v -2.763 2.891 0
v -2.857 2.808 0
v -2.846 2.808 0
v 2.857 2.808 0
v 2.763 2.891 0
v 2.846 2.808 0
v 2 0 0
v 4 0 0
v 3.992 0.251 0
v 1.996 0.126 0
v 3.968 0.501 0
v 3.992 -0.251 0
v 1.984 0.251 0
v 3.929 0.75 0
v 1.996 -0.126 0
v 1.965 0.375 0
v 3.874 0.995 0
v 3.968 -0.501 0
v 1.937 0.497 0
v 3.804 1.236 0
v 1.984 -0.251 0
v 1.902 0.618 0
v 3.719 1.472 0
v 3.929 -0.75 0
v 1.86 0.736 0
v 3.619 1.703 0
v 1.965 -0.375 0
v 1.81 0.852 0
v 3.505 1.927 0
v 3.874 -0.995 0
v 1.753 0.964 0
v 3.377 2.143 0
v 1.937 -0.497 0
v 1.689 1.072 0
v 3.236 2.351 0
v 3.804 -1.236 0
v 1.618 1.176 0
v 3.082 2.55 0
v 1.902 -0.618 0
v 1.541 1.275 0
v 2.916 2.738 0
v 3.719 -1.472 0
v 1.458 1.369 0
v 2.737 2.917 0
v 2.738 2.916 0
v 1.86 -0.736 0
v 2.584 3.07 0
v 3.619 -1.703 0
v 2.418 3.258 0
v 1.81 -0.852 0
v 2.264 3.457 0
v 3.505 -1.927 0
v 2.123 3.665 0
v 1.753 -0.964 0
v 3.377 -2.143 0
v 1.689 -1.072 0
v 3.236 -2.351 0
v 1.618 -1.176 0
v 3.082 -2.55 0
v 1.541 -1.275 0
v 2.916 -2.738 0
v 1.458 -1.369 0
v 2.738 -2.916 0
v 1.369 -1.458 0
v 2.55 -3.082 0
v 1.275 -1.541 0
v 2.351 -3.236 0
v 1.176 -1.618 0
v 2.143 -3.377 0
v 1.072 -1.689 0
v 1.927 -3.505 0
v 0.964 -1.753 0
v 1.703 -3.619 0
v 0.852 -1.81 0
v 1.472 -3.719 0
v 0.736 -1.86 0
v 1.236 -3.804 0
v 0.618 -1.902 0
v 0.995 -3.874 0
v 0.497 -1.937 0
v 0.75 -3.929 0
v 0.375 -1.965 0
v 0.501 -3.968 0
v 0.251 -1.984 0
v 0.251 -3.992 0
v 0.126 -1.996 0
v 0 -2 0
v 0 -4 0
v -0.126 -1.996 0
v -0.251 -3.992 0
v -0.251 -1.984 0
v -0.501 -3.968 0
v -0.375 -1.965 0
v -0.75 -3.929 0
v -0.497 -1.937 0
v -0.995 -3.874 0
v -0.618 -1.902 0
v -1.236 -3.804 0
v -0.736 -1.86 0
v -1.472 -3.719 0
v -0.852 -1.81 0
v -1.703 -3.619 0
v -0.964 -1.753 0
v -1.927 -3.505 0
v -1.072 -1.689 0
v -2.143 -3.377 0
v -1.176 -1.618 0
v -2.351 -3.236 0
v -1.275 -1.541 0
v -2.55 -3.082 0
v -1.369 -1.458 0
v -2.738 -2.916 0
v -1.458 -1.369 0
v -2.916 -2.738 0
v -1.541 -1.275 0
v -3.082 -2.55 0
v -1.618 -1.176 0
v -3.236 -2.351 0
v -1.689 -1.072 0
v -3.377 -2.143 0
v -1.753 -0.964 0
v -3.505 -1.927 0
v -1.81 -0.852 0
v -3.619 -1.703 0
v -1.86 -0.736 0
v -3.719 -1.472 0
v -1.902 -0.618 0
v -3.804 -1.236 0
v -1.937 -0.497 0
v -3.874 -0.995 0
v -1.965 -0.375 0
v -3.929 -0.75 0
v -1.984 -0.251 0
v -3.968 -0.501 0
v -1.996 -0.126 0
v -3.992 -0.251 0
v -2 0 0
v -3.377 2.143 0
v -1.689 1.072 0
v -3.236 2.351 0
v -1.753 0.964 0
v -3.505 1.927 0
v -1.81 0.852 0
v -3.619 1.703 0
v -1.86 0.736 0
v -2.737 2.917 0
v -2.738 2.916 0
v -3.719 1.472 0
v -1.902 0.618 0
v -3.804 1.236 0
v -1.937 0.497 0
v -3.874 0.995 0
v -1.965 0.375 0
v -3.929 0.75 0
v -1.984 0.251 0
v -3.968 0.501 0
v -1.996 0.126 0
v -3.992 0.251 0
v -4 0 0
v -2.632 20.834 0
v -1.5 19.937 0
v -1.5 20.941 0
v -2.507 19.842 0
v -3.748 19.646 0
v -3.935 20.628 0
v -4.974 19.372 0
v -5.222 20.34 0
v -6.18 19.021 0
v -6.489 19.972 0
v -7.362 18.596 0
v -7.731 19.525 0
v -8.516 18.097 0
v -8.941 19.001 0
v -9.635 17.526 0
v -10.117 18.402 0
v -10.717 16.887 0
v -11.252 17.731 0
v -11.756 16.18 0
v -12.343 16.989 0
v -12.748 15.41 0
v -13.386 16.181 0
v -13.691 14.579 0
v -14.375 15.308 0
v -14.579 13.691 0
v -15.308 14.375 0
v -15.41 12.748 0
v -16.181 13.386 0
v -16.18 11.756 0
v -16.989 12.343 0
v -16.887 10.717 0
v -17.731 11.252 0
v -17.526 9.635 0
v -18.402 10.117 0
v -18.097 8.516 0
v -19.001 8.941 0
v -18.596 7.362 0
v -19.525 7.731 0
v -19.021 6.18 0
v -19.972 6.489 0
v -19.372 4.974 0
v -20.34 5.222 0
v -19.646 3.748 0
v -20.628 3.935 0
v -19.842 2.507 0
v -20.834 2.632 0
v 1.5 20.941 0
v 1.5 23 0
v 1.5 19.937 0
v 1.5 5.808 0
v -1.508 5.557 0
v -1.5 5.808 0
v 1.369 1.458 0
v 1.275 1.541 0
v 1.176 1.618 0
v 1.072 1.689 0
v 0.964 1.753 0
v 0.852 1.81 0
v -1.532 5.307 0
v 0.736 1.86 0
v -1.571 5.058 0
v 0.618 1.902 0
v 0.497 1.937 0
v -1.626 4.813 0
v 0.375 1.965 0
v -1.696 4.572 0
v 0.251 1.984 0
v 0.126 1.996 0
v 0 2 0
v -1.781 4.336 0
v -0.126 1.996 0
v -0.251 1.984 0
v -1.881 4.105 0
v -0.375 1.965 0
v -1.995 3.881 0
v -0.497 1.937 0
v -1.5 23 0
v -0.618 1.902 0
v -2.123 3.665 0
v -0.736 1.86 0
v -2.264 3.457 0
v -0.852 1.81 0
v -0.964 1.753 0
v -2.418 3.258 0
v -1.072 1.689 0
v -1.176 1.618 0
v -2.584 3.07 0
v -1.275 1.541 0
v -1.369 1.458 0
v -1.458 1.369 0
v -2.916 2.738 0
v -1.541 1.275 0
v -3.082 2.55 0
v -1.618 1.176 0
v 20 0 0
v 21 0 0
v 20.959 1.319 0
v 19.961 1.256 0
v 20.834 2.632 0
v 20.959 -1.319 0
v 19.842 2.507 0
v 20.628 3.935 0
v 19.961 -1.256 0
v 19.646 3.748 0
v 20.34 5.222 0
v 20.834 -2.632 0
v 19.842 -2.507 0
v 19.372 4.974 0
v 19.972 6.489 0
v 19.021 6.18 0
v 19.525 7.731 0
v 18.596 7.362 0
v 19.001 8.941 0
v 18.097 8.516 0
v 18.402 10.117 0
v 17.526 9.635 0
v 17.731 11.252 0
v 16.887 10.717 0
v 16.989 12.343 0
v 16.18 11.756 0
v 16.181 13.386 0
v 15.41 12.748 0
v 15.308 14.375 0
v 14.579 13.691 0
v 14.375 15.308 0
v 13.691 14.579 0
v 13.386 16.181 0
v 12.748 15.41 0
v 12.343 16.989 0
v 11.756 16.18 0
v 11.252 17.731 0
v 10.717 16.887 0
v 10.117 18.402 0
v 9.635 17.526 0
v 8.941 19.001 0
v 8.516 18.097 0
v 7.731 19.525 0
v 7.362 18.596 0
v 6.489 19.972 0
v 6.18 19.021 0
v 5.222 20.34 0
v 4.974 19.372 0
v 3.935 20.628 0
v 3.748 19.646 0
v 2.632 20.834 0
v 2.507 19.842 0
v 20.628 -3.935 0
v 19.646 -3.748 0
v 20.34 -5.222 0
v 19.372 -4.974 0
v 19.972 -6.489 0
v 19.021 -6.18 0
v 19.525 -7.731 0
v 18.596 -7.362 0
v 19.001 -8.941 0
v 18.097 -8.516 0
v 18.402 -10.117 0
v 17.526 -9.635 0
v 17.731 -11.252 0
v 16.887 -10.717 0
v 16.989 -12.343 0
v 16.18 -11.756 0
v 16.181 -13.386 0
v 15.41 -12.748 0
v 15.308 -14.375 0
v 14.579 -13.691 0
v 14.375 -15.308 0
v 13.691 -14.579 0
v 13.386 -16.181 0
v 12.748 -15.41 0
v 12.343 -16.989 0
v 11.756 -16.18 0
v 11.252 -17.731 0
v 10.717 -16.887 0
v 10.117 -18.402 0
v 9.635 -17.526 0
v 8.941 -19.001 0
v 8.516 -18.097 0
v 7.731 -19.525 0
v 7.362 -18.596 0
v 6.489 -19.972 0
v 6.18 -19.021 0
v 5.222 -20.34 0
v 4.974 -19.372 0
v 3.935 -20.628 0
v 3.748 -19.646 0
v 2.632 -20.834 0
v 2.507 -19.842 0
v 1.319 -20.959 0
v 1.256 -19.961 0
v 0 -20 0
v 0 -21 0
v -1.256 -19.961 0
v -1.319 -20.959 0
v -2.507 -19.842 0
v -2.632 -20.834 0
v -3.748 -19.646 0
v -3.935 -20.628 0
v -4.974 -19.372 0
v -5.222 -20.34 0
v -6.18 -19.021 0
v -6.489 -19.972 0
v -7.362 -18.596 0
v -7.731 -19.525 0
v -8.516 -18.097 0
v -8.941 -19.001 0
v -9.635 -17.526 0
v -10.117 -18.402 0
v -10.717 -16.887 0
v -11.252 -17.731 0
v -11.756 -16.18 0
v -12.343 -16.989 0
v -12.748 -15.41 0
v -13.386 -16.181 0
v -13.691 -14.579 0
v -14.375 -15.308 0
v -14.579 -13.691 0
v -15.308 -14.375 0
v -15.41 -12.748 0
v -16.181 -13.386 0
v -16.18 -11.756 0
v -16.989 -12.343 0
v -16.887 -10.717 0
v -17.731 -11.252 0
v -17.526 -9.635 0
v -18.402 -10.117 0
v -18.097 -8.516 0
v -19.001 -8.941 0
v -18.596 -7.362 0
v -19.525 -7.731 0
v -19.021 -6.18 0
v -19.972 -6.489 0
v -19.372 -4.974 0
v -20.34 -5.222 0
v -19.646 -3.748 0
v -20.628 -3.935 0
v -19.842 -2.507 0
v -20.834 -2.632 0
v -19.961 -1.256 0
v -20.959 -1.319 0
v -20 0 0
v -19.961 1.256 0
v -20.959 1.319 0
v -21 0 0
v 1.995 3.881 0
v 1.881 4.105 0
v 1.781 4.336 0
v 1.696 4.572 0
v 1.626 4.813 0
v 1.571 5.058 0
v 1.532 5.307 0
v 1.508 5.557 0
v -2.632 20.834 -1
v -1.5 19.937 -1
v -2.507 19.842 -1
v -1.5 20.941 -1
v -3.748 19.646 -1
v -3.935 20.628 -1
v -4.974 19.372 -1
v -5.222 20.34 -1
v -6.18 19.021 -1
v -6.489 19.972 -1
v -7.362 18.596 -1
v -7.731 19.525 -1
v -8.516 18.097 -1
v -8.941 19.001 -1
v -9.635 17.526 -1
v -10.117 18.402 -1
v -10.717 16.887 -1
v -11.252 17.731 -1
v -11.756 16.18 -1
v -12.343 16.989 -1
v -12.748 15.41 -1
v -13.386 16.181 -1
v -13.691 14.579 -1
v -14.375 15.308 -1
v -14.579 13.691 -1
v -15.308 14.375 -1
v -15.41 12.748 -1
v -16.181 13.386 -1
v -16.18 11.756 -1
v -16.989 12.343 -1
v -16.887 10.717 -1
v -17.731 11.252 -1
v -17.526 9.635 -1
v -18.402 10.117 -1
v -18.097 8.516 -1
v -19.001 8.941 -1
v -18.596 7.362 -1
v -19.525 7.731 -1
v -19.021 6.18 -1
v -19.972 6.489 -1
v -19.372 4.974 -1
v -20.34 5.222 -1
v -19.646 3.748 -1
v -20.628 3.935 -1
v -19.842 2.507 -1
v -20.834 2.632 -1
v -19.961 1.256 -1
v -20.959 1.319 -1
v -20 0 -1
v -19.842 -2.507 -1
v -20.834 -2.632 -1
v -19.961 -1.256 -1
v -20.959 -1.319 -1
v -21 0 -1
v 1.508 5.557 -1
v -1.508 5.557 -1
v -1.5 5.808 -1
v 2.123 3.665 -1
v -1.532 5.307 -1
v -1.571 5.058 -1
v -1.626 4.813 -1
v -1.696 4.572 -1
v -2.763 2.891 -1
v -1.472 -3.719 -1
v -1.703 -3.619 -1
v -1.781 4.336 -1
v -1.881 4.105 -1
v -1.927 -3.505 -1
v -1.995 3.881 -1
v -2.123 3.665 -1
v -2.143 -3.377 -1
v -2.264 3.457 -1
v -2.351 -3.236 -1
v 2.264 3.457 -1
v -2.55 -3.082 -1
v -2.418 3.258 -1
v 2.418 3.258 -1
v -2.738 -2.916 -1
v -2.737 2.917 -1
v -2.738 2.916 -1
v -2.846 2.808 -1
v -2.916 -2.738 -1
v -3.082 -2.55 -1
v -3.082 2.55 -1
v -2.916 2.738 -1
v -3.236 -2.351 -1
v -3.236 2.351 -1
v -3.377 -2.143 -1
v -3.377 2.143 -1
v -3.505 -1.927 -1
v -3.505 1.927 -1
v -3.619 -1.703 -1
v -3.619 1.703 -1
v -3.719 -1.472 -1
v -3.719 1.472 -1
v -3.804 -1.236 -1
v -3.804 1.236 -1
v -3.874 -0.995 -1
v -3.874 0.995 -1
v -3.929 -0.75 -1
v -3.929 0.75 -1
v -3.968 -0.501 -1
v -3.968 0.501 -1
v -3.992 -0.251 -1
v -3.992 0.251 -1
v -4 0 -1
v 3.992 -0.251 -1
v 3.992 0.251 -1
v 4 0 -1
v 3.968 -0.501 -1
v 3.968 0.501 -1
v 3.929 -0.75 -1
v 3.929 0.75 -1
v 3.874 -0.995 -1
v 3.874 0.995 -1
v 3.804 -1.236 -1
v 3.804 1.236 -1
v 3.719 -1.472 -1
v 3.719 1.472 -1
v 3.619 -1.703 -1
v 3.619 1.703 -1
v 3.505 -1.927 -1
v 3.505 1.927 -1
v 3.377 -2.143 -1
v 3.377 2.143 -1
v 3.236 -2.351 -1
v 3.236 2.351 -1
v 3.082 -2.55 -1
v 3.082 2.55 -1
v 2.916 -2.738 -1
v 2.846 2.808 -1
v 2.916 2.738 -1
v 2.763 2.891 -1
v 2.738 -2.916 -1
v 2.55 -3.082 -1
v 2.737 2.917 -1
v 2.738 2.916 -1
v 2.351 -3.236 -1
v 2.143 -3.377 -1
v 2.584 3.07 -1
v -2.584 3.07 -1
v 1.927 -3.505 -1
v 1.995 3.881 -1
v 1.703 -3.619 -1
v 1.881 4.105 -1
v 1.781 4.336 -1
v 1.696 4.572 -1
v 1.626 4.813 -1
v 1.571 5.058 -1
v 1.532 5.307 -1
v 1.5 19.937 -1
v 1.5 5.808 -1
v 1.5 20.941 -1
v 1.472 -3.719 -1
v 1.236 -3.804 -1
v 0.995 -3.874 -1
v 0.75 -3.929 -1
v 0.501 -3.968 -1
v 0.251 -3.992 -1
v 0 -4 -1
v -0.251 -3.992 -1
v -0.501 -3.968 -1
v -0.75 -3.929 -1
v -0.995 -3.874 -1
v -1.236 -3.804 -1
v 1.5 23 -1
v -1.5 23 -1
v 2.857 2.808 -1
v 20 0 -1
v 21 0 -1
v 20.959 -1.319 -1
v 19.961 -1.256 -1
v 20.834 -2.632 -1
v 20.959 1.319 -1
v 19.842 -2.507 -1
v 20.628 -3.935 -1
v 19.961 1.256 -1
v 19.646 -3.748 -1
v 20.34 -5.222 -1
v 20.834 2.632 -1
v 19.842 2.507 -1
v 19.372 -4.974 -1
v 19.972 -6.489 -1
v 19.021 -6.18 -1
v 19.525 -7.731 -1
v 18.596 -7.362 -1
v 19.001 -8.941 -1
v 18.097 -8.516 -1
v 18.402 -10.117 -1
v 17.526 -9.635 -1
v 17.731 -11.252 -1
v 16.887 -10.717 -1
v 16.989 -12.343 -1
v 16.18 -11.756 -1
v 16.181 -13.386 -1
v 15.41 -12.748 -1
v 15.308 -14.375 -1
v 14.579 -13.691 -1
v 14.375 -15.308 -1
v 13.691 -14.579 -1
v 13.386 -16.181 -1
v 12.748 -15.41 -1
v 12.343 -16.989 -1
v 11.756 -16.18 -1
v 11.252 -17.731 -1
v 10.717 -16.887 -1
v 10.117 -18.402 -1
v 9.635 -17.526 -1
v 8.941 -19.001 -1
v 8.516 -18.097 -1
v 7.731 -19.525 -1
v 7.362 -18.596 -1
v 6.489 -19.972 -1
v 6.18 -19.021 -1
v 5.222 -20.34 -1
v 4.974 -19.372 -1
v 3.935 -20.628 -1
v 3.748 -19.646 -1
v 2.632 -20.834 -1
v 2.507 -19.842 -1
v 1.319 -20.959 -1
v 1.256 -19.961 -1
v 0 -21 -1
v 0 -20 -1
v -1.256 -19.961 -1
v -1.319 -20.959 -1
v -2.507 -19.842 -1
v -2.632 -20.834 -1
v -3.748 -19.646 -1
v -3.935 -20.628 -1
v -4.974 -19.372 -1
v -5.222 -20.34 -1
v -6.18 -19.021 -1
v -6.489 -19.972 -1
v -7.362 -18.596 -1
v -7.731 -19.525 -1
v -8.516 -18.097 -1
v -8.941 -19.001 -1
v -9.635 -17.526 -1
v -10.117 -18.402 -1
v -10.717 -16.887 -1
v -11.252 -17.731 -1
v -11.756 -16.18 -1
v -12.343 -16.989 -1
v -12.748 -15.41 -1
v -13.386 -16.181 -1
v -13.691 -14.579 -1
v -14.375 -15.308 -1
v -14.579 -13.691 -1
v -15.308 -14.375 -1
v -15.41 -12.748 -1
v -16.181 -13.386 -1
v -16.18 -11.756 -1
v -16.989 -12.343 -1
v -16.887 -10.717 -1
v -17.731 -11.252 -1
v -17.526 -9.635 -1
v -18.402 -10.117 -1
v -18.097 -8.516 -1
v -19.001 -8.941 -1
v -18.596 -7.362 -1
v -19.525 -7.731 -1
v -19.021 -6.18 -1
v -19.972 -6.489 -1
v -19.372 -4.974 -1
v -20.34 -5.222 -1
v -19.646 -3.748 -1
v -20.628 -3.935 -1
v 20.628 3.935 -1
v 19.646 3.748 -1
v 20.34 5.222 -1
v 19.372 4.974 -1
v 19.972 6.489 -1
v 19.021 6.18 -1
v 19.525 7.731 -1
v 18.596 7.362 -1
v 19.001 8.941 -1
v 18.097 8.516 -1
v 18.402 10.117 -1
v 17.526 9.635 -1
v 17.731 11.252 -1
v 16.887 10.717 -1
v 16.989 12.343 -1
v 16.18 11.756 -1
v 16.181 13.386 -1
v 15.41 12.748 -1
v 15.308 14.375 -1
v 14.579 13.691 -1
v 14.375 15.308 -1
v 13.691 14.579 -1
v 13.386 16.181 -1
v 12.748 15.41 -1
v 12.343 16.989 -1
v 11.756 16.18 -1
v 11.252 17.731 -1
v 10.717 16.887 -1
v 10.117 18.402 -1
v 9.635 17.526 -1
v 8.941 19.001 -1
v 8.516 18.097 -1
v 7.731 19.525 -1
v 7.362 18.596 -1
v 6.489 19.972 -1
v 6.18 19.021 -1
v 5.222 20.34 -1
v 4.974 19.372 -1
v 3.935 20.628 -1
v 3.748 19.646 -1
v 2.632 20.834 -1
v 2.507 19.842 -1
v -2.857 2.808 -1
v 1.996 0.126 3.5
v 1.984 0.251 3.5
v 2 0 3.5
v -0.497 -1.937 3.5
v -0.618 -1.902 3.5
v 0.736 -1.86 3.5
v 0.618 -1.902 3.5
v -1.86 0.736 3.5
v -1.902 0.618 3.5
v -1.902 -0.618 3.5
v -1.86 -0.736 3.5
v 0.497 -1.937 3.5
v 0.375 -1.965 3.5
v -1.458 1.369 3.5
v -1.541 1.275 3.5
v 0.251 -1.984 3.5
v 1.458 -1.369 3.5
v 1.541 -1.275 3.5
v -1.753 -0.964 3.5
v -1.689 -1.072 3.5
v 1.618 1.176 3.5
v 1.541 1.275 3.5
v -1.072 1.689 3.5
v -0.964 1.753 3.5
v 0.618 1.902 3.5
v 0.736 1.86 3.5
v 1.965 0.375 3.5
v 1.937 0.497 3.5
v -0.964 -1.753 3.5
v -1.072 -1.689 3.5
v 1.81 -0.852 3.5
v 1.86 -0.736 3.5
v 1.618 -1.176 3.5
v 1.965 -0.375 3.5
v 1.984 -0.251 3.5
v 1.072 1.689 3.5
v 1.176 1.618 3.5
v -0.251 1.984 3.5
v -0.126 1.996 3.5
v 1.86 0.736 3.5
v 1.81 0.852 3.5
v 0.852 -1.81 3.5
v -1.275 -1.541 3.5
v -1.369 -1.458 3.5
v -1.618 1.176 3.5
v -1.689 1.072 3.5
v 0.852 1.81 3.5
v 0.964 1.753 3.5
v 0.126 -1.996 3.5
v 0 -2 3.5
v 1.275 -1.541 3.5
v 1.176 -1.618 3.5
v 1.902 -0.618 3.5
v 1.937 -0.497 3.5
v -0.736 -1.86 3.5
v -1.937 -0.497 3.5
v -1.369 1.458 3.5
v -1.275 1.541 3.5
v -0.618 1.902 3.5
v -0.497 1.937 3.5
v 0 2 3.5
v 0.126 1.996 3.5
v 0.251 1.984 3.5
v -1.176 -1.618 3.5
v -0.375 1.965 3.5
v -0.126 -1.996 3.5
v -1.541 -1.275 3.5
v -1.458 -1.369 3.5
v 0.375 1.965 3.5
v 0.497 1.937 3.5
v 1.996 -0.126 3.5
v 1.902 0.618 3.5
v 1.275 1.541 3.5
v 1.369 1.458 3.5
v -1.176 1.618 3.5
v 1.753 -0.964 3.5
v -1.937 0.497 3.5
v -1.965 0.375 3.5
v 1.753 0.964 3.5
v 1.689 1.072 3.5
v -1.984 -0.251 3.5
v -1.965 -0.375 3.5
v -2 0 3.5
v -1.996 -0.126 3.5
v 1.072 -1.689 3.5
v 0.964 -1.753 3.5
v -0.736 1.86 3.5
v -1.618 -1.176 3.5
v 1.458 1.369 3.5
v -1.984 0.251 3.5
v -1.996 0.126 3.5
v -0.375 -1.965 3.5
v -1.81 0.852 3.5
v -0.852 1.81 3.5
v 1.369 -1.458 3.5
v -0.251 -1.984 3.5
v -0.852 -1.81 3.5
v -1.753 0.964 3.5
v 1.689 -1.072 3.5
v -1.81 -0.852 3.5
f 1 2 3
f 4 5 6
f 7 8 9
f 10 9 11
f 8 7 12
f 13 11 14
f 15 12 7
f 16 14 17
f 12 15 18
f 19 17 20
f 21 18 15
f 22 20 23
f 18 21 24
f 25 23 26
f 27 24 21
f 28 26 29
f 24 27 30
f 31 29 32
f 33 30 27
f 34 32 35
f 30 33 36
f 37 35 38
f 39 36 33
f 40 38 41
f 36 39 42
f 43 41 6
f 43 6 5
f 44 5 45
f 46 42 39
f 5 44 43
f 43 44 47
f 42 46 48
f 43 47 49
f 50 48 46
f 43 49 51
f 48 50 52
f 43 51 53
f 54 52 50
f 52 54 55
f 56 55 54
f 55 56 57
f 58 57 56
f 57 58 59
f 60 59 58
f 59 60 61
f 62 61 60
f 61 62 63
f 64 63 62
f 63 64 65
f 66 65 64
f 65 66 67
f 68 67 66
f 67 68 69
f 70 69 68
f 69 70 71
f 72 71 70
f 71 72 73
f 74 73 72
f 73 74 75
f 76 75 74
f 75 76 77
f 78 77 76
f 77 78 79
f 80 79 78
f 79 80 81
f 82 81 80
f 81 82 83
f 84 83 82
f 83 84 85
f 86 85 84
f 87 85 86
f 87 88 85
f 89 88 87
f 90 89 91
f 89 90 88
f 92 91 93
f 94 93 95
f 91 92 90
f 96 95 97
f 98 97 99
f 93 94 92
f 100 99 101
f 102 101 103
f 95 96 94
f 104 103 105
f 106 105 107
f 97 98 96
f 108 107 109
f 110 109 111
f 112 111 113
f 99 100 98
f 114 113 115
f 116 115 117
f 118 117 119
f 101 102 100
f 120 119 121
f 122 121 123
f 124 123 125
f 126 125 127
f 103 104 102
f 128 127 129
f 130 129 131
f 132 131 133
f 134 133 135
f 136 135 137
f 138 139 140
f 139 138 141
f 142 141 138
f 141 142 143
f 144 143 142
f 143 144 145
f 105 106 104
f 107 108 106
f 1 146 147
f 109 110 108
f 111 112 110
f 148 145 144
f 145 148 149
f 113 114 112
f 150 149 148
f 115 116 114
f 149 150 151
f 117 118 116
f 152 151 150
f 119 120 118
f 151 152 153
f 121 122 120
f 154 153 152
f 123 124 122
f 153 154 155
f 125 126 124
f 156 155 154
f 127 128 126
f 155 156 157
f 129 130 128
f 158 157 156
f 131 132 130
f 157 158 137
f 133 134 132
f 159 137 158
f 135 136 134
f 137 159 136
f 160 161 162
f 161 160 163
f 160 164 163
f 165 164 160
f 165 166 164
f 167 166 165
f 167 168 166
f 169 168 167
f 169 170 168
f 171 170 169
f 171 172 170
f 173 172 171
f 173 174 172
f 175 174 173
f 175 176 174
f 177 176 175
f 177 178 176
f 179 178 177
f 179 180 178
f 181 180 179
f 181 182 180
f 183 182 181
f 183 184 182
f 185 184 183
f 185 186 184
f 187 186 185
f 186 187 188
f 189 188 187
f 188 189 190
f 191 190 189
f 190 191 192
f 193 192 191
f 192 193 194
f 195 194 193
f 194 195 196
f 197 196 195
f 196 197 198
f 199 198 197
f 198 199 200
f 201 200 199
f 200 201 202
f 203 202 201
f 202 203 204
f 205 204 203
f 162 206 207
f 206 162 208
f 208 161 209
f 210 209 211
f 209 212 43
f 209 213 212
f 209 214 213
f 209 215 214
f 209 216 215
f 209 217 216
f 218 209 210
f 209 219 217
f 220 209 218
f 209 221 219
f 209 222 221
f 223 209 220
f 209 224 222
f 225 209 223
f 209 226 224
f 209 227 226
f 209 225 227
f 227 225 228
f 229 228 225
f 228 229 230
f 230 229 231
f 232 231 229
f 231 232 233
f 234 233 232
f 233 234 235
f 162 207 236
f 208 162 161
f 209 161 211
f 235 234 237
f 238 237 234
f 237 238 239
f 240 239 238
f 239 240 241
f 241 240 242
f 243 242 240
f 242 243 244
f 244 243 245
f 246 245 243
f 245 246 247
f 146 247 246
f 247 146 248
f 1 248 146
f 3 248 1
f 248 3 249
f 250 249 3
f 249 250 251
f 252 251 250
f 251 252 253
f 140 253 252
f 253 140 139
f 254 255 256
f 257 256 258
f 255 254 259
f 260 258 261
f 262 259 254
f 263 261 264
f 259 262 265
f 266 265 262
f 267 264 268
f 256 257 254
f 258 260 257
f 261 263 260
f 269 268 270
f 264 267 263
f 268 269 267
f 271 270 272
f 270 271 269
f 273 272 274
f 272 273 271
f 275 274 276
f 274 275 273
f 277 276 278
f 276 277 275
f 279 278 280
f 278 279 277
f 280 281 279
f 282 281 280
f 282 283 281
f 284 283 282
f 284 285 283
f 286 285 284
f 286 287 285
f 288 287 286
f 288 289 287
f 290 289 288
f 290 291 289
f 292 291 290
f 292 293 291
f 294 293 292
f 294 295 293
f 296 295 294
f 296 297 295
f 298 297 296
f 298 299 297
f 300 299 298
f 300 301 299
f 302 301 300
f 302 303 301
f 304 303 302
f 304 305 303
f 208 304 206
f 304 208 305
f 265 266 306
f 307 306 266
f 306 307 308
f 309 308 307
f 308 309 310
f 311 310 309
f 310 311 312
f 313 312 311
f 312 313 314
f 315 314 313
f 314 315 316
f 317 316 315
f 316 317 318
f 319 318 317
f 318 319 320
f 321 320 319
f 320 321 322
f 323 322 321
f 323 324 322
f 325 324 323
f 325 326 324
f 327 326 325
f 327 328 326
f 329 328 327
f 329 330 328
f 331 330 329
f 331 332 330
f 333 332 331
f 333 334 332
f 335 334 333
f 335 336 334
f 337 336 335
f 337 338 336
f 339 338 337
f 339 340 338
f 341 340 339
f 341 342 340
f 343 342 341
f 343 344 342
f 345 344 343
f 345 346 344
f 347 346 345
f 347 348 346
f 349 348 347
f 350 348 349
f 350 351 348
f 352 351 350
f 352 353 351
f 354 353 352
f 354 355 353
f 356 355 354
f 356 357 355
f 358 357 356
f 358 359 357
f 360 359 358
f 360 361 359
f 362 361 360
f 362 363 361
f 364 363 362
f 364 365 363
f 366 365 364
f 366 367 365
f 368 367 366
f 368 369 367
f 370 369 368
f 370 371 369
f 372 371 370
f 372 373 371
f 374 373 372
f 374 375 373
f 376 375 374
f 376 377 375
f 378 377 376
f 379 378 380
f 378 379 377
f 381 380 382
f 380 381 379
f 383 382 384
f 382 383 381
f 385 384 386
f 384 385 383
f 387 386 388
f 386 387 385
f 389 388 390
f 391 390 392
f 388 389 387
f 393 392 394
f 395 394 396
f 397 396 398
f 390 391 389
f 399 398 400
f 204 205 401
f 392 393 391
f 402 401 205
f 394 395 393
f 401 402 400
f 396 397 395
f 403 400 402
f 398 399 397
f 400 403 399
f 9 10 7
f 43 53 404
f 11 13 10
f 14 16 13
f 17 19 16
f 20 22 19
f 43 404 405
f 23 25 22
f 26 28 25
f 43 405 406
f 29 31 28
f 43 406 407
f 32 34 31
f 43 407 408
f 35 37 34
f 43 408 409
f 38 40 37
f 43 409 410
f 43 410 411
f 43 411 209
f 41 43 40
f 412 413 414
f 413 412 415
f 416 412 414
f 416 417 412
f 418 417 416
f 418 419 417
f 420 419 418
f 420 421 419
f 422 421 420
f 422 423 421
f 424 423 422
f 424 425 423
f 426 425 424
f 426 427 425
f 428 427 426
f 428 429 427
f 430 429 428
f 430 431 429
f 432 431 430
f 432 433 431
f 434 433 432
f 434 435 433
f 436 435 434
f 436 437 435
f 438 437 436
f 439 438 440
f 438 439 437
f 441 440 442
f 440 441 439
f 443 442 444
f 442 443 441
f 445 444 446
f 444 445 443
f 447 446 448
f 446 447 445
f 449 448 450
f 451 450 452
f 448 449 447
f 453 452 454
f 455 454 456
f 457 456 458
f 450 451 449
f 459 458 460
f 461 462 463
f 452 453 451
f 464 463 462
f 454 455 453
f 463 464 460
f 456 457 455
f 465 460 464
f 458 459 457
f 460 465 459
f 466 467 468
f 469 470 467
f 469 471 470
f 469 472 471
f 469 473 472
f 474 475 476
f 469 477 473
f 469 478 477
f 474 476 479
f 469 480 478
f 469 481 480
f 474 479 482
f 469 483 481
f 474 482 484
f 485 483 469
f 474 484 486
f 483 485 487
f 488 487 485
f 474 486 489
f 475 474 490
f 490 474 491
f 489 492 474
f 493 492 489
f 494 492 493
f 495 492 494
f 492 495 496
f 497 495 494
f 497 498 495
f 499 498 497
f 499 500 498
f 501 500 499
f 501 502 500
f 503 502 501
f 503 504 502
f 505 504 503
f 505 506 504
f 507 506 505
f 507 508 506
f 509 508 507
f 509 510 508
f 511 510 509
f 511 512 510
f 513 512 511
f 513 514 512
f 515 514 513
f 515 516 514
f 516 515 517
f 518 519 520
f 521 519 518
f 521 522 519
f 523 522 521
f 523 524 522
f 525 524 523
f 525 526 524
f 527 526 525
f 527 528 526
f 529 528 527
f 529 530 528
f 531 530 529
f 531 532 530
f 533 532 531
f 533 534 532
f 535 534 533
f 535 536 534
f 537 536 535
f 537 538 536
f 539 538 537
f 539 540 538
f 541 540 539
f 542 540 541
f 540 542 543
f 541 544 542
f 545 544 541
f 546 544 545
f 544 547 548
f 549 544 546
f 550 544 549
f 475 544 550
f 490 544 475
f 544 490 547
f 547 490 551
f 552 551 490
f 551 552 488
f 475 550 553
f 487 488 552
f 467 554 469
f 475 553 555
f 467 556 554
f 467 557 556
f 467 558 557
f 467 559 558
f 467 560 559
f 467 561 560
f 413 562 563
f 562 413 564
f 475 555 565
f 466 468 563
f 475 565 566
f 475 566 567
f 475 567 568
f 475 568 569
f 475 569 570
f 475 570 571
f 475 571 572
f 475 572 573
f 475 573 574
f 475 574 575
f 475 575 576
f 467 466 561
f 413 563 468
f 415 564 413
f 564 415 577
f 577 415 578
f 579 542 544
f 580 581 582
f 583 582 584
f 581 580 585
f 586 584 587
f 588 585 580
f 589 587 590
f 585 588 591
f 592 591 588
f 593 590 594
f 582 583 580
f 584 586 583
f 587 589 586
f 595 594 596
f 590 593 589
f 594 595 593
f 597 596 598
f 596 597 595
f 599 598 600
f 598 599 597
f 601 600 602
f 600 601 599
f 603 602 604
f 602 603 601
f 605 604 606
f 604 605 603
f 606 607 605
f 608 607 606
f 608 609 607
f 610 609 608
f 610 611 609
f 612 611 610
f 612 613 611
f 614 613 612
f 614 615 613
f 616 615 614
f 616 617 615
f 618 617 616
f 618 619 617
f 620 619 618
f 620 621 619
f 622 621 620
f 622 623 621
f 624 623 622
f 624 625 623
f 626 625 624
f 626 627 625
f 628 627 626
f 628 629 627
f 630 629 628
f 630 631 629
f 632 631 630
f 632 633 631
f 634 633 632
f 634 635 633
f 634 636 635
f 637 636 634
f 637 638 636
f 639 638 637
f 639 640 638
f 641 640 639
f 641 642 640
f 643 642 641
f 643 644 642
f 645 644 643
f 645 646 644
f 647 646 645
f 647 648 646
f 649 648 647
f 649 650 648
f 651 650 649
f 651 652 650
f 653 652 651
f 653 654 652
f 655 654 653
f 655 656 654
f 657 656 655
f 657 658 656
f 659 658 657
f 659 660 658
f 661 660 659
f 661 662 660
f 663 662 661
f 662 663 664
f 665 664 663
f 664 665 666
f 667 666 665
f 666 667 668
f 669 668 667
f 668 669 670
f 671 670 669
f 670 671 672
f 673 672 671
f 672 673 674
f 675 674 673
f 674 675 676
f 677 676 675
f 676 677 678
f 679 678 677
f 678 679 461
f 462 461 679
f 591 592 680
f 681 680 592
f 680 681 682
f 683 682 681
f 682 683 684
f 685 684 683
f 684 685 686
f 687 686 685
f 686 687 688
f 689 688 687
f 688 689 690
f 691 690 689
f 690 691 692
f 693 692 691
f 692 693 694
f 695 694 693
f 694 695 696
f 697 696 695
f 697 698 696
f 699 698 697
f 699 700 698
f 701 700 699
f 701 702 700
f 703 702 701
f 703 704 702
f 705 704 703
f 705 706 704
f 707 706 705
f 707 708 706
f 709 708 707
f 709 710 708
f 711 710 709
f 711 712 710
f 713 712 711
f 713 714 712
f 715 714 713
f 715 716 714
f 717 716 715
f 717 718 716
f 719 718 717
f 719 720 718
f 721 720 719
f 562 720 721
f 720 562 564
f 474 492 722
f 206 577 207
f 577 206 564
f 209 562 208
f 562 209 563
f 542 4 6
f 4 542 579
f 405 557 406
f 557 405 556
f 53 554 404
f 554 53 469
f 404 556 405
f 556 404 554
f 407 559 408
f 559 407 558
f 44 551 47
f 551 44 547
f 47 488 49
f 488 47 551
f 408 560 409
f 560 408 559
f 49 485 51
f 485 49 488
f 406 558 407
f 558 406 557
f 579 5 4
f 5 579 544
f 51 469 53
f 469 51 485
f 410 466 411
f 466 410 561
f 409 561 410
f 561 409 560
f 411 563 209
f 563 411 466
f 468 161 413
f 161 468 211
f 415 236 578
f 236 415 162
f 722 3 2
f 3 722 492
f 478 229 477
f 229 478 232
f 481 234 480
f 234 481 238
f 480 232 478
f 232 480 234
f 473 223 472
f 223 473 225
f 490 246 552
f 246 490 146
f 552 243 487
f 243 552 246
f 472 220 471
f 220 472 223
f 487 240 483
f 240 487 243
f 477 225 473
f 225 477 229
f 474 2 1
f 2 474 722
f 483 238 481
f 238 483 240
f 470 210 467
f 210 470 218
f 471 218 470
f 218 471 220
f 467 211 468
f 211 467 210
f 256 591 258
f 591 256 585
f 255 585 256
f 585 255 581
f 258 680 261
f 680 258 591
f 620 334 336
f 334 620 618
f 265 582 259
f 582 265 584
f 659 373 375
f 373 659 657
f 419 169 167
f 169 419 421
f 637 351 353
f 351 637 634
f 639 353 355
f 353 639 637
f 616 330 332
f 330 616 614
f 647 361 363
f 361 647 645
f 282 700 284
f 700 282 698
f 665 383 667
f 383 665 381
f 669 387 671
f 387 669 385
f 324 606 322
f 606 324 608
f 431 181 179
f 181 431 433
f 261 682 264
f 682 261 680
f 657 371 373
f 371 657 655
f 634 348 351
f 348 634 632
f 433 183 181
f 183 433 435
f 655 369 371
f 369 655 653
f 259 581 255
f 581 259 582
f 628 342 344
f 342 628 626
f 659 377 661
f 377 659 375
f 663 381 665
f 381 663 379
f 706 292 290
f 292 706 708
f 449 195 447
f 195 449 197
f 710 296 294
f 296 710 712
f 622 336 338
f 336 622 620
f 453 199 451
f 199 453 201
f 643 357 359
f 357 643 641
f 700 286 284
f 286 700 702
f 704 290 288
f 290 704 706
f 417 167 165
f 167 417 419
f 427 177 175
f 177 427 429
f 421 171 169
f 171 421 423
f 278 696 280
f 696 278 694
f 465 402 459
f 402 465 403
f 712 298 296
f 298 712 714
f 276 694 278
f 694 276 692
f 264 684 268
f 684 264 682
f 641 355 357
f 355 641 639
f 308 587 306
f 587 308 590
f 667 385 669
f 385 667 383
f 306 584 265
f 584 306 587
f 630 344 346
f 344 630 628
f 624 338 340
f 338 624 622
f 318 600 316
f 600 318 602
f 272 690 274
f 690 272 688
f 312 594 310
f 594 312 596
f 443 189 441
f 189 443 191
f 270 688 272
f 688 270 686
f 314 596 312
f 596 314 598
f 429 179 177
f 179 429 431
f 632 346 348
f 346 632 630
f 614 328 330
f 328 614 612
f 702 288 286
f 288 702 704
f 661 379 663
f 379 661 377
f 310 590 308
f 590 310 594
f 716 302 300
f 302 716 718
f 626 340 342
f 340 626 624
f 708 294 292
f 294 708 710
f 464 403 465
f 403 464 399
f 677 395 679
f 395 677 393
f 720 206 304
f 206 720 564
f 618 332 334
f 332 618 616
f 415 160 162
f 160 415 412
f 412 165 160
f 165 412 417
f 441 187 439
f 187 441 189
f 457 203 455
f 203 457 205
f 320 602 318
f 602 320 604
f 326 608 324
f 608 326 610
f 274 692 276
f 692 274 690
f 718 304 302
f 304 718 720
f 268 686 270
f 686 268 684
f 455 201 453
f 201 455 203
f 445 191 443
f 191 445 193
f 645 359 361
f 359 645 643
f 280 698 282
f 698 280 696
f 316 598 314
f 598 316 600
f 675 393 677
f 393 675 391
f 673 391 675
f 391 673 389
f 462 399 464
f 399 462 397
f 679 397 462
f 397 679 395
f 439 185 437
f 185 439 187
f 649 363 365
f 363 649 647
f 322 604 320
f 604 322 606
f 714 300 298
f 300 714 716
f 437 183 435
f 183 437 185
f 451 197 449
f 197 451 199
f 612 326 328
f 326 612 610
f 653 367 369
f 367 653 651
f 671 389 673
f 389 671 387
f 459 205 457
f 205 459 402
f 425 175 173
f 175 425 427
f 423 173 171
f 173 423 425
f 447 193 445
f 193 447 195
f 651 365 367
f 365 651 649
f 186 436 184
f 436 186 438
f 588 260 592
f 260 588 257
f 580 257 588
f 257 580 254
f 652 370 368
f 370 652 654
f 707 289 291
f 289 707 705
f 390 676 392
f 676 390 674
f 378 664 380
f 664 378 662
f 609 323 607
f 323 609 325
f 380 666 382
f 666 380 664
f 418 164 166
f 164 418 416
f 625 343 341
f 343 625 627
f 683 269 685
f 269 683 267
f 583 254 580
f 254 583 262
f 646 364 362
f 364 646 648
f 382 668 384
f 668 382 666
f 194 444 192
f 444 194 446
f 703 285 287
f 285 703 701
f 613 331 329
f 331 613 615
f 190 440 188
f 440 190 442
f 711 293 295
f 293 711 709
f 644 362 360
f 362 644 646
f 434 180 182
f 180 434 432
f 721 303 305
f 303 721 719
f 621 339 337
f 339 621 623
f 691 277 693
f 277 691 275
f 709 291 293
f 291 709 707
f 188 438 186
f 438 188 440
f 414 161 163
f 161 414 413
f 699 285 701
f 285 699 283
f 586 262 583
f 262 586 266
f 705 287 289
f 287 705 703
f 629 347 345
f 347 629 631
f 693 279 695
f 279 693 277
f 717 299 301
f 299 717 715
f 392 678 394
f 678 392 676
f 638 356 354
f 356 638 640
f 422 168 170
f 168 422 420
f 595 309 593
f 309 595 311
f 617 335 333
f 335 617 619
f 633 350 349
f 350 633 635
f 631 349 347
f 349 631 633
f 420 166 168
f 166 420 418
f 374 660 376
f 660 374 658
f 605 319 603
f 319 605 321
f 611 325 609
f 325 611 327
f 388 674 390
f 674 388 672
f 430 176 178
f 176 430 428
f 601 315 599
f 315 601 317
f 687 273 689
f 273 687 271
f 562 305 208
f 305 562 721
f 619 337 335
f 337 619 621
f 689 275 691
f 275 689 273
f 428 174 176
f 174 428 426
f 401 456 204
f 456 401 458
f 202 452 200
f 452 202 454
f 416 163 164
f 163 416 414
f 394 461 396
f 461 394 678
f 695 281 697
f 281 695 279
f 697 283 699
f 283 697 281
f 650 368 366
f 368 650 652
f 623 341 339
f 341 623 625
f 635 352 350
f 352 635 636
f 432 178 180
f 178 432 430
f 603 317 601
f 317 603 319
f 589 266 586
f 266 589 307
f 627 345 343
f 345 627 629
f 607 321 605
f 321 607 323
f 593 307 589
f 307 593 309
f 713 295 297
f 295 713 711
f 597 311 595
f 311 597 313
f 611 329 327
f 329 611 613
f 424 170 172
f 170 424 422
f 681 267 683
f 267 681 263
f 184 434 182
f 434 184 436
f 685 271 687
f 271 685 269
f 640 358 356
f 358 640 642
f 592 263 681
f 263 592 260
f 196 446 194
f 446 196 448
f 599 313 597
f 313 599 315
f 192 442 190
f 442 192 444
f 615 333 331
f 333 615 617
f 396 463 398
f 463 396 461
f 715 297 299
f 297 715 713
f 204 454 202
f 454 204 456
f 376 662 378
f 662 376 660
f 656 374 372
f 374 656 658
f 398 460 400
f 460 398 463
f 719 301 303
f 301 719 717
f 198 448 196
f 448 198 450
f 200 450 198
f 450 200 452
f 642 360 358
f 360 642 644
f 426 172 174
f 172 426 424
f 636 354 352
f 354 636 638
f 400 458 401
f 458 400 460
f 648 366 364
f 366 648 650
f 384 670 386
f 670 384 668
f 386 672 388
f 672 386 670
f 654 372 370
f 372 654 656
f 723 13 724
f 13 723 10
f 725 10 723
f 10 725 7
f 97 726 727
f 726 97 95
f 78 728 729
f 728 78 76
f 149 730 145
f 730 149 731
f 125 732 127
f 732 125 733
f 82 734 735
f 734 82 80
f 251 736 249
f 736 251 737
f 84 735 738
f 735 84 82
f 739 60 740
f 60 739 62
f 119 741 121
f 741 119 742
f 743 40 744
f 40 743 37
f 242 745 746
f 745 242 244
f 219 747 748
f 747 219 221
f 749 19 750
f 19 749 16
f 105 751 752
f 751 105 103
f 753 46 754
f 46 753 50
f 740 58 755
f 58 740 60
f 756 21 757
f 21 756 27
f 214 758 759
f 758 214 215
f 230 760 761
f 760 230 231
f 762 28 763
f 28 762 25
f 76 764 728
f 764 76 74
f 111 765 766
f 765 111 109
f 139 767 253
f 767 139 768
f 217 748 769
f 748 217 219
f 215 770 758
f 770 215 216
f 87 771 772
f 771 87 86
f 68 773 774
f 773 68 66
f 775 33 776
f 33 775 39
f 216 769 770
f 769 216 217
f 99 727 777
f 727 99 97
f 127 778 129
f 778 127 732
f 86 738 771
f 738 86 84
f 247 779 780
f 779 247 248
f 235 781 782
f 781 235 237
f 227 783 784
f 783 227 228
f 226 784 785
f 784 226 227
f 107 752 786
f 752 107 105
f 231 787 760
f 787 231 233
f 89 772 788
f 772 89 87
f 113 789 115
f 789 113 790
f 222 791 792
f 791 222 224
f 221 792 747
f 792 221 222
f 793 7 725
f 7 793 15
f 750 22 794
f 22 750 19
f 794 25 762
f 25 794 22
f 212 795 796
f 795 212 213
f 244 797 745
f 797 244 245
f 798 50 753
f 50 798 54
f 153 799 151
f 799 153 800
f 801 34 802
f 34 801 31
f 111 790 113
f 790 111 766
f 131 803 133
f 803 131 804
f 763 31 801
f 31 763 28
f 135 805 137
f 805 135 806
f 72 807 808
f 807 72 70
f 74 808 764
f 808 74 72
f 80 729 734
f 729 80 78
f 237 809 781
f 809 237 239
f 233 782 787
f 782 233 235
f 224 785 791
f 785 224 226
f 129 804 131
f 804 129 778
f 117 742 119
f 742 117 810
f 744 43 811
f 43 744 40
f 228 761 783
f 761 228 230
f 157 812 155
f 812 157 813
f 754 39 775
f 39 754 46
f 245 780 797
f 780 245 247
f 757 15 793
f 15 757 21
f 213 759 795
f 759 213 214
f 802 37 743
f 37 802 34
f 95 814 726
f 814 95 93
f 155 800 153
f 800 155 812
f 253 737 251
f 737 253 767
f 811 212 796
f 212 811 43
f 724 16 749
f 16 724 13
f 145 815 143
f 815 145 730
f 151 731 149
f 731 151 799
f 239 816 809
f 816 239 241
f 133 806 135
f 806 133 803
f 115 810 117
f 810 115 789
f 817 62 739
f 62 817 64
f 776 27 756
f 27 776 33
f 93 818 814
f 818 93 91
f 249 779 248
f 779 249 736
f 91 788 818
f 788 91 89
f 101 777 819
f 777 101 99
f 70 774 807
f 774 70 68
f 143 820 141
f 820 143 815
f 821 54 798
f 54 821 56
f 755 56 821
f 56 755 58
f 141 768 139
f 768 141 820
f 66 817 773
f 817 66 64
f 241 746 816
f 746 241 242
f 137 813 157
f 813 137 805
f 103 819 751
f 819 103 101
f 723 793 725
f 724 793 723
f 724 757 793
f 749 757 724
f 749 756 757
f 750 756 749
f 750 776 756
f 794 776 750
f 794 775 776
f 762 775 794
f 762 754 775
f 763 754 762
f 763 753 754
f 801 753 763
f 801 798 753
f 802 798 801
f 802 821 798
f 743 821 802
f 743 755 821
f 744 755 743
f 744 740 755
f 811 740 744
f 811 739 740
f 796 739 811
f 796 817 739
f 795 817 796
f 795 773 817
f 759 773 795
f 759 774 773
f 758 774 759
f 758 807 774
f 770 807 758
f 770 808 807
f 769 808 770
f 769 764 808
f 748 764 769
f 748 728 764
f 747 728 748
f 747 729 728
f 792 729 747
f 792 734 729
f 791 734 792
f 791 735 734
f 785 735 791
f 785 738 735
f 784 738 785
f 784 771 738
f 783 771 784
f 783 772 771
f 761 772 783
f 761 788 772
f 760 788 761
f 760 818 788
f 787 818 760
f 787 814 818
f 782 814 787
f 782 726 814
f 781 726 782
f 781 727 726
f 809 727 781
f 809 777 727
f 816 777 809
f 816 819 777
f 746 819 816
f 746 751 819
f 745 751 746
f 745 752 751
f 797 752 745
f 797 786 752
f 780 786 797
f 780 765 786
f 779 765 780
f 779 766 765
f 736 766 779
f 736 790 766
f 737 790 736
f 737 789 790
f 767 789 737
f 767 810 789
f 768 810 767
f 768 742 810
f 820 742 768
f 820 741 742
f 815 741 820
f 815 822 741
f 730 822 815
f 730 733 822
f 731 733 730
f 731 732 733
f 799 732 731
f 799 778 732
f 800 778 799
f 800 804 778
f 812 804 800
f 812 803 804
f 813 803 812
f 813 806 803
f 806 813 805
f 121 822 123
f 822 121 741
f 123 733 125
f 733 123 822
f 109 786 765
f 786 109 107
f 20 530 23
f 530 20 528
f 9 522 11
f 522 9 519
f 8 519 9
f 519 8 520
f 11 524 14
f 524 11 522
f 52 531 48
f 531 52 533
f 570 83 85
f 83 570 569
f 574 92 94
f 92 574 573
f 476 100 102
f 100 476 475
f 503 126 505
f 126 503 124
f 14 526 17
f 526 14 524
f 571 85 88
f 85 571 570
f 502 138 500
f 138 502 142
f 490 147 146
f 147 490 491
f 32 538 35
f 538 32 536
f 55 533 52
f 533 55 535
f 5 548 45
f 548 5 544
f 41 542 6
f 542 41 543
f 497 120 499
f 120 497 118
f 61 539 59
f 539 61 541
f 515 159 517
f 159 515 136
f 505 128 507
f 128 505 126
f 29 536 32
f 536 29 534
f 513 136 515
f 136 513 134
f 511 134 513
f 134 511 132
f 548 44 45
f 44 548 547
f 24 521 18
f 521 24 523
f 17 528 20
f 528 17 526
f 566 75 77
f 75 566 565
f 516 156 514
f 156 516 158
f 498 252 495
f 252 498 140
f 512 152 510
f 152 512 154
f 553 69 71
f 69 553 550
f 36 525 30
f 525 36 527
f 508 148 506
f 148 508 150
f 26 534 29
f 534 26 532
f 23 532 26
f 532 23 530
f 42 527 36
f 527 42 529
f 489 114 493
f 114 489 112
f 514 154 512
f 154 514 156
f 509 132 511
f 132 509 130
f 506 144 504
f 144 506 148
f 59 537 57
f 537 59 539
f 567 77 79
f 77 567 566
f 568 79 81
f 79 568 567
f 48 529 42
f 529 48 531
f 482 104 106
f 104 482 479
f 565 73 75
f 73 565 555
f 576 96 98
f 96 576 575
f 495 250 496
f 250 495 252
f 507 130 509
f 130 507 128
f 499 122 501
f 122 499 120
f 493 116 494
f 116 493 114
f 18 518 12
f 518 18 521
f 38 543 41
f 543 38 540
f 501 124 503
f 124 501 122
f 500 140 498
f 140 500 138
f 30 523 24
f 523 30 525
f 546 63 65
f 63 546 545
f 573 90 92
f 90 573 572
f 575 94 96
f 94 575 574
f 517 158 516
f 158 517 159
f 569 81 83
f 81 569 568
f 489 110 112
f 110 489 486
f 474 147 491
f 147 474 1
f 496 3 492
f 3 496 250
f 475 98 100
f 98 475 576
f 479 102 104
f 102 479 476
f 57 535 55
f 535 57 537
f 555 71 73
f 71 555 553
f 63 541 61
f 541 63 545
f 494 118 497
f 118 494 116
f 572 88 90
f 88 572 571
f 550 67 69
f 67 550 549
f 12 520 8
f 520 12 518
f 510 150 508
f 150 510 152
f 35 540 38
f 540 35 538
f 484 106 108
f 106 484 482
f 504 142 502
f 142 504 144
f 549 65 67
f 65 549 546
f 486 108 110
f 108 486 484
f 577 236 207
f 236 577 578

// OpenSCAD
$fn=100;
cylinder(h=3.5,r=2);
translate([0,0,-1]) cylinder(h=1,r=4);
translate([-1.5,0,-1]) cube([3,23,1]);
translate([1.5,1.808,-1]) difference() {
    translate([0,1,0]) cube([4,3,1]);
    translate([4,4,0]) cylinder(h=1,r=4);
}
mirror([1,0,0]) translate([1.5,1.808,-1]) difference() {
    translate([0,1,0]) cube([4,3,1]);
    translate([4,4,0]) cylinder(h=1,r=4);
}


translate([0,0,-1]) difference() {
    cylinder(h=1,r=21);
    cylinder(h=1,r=21-1);
}
